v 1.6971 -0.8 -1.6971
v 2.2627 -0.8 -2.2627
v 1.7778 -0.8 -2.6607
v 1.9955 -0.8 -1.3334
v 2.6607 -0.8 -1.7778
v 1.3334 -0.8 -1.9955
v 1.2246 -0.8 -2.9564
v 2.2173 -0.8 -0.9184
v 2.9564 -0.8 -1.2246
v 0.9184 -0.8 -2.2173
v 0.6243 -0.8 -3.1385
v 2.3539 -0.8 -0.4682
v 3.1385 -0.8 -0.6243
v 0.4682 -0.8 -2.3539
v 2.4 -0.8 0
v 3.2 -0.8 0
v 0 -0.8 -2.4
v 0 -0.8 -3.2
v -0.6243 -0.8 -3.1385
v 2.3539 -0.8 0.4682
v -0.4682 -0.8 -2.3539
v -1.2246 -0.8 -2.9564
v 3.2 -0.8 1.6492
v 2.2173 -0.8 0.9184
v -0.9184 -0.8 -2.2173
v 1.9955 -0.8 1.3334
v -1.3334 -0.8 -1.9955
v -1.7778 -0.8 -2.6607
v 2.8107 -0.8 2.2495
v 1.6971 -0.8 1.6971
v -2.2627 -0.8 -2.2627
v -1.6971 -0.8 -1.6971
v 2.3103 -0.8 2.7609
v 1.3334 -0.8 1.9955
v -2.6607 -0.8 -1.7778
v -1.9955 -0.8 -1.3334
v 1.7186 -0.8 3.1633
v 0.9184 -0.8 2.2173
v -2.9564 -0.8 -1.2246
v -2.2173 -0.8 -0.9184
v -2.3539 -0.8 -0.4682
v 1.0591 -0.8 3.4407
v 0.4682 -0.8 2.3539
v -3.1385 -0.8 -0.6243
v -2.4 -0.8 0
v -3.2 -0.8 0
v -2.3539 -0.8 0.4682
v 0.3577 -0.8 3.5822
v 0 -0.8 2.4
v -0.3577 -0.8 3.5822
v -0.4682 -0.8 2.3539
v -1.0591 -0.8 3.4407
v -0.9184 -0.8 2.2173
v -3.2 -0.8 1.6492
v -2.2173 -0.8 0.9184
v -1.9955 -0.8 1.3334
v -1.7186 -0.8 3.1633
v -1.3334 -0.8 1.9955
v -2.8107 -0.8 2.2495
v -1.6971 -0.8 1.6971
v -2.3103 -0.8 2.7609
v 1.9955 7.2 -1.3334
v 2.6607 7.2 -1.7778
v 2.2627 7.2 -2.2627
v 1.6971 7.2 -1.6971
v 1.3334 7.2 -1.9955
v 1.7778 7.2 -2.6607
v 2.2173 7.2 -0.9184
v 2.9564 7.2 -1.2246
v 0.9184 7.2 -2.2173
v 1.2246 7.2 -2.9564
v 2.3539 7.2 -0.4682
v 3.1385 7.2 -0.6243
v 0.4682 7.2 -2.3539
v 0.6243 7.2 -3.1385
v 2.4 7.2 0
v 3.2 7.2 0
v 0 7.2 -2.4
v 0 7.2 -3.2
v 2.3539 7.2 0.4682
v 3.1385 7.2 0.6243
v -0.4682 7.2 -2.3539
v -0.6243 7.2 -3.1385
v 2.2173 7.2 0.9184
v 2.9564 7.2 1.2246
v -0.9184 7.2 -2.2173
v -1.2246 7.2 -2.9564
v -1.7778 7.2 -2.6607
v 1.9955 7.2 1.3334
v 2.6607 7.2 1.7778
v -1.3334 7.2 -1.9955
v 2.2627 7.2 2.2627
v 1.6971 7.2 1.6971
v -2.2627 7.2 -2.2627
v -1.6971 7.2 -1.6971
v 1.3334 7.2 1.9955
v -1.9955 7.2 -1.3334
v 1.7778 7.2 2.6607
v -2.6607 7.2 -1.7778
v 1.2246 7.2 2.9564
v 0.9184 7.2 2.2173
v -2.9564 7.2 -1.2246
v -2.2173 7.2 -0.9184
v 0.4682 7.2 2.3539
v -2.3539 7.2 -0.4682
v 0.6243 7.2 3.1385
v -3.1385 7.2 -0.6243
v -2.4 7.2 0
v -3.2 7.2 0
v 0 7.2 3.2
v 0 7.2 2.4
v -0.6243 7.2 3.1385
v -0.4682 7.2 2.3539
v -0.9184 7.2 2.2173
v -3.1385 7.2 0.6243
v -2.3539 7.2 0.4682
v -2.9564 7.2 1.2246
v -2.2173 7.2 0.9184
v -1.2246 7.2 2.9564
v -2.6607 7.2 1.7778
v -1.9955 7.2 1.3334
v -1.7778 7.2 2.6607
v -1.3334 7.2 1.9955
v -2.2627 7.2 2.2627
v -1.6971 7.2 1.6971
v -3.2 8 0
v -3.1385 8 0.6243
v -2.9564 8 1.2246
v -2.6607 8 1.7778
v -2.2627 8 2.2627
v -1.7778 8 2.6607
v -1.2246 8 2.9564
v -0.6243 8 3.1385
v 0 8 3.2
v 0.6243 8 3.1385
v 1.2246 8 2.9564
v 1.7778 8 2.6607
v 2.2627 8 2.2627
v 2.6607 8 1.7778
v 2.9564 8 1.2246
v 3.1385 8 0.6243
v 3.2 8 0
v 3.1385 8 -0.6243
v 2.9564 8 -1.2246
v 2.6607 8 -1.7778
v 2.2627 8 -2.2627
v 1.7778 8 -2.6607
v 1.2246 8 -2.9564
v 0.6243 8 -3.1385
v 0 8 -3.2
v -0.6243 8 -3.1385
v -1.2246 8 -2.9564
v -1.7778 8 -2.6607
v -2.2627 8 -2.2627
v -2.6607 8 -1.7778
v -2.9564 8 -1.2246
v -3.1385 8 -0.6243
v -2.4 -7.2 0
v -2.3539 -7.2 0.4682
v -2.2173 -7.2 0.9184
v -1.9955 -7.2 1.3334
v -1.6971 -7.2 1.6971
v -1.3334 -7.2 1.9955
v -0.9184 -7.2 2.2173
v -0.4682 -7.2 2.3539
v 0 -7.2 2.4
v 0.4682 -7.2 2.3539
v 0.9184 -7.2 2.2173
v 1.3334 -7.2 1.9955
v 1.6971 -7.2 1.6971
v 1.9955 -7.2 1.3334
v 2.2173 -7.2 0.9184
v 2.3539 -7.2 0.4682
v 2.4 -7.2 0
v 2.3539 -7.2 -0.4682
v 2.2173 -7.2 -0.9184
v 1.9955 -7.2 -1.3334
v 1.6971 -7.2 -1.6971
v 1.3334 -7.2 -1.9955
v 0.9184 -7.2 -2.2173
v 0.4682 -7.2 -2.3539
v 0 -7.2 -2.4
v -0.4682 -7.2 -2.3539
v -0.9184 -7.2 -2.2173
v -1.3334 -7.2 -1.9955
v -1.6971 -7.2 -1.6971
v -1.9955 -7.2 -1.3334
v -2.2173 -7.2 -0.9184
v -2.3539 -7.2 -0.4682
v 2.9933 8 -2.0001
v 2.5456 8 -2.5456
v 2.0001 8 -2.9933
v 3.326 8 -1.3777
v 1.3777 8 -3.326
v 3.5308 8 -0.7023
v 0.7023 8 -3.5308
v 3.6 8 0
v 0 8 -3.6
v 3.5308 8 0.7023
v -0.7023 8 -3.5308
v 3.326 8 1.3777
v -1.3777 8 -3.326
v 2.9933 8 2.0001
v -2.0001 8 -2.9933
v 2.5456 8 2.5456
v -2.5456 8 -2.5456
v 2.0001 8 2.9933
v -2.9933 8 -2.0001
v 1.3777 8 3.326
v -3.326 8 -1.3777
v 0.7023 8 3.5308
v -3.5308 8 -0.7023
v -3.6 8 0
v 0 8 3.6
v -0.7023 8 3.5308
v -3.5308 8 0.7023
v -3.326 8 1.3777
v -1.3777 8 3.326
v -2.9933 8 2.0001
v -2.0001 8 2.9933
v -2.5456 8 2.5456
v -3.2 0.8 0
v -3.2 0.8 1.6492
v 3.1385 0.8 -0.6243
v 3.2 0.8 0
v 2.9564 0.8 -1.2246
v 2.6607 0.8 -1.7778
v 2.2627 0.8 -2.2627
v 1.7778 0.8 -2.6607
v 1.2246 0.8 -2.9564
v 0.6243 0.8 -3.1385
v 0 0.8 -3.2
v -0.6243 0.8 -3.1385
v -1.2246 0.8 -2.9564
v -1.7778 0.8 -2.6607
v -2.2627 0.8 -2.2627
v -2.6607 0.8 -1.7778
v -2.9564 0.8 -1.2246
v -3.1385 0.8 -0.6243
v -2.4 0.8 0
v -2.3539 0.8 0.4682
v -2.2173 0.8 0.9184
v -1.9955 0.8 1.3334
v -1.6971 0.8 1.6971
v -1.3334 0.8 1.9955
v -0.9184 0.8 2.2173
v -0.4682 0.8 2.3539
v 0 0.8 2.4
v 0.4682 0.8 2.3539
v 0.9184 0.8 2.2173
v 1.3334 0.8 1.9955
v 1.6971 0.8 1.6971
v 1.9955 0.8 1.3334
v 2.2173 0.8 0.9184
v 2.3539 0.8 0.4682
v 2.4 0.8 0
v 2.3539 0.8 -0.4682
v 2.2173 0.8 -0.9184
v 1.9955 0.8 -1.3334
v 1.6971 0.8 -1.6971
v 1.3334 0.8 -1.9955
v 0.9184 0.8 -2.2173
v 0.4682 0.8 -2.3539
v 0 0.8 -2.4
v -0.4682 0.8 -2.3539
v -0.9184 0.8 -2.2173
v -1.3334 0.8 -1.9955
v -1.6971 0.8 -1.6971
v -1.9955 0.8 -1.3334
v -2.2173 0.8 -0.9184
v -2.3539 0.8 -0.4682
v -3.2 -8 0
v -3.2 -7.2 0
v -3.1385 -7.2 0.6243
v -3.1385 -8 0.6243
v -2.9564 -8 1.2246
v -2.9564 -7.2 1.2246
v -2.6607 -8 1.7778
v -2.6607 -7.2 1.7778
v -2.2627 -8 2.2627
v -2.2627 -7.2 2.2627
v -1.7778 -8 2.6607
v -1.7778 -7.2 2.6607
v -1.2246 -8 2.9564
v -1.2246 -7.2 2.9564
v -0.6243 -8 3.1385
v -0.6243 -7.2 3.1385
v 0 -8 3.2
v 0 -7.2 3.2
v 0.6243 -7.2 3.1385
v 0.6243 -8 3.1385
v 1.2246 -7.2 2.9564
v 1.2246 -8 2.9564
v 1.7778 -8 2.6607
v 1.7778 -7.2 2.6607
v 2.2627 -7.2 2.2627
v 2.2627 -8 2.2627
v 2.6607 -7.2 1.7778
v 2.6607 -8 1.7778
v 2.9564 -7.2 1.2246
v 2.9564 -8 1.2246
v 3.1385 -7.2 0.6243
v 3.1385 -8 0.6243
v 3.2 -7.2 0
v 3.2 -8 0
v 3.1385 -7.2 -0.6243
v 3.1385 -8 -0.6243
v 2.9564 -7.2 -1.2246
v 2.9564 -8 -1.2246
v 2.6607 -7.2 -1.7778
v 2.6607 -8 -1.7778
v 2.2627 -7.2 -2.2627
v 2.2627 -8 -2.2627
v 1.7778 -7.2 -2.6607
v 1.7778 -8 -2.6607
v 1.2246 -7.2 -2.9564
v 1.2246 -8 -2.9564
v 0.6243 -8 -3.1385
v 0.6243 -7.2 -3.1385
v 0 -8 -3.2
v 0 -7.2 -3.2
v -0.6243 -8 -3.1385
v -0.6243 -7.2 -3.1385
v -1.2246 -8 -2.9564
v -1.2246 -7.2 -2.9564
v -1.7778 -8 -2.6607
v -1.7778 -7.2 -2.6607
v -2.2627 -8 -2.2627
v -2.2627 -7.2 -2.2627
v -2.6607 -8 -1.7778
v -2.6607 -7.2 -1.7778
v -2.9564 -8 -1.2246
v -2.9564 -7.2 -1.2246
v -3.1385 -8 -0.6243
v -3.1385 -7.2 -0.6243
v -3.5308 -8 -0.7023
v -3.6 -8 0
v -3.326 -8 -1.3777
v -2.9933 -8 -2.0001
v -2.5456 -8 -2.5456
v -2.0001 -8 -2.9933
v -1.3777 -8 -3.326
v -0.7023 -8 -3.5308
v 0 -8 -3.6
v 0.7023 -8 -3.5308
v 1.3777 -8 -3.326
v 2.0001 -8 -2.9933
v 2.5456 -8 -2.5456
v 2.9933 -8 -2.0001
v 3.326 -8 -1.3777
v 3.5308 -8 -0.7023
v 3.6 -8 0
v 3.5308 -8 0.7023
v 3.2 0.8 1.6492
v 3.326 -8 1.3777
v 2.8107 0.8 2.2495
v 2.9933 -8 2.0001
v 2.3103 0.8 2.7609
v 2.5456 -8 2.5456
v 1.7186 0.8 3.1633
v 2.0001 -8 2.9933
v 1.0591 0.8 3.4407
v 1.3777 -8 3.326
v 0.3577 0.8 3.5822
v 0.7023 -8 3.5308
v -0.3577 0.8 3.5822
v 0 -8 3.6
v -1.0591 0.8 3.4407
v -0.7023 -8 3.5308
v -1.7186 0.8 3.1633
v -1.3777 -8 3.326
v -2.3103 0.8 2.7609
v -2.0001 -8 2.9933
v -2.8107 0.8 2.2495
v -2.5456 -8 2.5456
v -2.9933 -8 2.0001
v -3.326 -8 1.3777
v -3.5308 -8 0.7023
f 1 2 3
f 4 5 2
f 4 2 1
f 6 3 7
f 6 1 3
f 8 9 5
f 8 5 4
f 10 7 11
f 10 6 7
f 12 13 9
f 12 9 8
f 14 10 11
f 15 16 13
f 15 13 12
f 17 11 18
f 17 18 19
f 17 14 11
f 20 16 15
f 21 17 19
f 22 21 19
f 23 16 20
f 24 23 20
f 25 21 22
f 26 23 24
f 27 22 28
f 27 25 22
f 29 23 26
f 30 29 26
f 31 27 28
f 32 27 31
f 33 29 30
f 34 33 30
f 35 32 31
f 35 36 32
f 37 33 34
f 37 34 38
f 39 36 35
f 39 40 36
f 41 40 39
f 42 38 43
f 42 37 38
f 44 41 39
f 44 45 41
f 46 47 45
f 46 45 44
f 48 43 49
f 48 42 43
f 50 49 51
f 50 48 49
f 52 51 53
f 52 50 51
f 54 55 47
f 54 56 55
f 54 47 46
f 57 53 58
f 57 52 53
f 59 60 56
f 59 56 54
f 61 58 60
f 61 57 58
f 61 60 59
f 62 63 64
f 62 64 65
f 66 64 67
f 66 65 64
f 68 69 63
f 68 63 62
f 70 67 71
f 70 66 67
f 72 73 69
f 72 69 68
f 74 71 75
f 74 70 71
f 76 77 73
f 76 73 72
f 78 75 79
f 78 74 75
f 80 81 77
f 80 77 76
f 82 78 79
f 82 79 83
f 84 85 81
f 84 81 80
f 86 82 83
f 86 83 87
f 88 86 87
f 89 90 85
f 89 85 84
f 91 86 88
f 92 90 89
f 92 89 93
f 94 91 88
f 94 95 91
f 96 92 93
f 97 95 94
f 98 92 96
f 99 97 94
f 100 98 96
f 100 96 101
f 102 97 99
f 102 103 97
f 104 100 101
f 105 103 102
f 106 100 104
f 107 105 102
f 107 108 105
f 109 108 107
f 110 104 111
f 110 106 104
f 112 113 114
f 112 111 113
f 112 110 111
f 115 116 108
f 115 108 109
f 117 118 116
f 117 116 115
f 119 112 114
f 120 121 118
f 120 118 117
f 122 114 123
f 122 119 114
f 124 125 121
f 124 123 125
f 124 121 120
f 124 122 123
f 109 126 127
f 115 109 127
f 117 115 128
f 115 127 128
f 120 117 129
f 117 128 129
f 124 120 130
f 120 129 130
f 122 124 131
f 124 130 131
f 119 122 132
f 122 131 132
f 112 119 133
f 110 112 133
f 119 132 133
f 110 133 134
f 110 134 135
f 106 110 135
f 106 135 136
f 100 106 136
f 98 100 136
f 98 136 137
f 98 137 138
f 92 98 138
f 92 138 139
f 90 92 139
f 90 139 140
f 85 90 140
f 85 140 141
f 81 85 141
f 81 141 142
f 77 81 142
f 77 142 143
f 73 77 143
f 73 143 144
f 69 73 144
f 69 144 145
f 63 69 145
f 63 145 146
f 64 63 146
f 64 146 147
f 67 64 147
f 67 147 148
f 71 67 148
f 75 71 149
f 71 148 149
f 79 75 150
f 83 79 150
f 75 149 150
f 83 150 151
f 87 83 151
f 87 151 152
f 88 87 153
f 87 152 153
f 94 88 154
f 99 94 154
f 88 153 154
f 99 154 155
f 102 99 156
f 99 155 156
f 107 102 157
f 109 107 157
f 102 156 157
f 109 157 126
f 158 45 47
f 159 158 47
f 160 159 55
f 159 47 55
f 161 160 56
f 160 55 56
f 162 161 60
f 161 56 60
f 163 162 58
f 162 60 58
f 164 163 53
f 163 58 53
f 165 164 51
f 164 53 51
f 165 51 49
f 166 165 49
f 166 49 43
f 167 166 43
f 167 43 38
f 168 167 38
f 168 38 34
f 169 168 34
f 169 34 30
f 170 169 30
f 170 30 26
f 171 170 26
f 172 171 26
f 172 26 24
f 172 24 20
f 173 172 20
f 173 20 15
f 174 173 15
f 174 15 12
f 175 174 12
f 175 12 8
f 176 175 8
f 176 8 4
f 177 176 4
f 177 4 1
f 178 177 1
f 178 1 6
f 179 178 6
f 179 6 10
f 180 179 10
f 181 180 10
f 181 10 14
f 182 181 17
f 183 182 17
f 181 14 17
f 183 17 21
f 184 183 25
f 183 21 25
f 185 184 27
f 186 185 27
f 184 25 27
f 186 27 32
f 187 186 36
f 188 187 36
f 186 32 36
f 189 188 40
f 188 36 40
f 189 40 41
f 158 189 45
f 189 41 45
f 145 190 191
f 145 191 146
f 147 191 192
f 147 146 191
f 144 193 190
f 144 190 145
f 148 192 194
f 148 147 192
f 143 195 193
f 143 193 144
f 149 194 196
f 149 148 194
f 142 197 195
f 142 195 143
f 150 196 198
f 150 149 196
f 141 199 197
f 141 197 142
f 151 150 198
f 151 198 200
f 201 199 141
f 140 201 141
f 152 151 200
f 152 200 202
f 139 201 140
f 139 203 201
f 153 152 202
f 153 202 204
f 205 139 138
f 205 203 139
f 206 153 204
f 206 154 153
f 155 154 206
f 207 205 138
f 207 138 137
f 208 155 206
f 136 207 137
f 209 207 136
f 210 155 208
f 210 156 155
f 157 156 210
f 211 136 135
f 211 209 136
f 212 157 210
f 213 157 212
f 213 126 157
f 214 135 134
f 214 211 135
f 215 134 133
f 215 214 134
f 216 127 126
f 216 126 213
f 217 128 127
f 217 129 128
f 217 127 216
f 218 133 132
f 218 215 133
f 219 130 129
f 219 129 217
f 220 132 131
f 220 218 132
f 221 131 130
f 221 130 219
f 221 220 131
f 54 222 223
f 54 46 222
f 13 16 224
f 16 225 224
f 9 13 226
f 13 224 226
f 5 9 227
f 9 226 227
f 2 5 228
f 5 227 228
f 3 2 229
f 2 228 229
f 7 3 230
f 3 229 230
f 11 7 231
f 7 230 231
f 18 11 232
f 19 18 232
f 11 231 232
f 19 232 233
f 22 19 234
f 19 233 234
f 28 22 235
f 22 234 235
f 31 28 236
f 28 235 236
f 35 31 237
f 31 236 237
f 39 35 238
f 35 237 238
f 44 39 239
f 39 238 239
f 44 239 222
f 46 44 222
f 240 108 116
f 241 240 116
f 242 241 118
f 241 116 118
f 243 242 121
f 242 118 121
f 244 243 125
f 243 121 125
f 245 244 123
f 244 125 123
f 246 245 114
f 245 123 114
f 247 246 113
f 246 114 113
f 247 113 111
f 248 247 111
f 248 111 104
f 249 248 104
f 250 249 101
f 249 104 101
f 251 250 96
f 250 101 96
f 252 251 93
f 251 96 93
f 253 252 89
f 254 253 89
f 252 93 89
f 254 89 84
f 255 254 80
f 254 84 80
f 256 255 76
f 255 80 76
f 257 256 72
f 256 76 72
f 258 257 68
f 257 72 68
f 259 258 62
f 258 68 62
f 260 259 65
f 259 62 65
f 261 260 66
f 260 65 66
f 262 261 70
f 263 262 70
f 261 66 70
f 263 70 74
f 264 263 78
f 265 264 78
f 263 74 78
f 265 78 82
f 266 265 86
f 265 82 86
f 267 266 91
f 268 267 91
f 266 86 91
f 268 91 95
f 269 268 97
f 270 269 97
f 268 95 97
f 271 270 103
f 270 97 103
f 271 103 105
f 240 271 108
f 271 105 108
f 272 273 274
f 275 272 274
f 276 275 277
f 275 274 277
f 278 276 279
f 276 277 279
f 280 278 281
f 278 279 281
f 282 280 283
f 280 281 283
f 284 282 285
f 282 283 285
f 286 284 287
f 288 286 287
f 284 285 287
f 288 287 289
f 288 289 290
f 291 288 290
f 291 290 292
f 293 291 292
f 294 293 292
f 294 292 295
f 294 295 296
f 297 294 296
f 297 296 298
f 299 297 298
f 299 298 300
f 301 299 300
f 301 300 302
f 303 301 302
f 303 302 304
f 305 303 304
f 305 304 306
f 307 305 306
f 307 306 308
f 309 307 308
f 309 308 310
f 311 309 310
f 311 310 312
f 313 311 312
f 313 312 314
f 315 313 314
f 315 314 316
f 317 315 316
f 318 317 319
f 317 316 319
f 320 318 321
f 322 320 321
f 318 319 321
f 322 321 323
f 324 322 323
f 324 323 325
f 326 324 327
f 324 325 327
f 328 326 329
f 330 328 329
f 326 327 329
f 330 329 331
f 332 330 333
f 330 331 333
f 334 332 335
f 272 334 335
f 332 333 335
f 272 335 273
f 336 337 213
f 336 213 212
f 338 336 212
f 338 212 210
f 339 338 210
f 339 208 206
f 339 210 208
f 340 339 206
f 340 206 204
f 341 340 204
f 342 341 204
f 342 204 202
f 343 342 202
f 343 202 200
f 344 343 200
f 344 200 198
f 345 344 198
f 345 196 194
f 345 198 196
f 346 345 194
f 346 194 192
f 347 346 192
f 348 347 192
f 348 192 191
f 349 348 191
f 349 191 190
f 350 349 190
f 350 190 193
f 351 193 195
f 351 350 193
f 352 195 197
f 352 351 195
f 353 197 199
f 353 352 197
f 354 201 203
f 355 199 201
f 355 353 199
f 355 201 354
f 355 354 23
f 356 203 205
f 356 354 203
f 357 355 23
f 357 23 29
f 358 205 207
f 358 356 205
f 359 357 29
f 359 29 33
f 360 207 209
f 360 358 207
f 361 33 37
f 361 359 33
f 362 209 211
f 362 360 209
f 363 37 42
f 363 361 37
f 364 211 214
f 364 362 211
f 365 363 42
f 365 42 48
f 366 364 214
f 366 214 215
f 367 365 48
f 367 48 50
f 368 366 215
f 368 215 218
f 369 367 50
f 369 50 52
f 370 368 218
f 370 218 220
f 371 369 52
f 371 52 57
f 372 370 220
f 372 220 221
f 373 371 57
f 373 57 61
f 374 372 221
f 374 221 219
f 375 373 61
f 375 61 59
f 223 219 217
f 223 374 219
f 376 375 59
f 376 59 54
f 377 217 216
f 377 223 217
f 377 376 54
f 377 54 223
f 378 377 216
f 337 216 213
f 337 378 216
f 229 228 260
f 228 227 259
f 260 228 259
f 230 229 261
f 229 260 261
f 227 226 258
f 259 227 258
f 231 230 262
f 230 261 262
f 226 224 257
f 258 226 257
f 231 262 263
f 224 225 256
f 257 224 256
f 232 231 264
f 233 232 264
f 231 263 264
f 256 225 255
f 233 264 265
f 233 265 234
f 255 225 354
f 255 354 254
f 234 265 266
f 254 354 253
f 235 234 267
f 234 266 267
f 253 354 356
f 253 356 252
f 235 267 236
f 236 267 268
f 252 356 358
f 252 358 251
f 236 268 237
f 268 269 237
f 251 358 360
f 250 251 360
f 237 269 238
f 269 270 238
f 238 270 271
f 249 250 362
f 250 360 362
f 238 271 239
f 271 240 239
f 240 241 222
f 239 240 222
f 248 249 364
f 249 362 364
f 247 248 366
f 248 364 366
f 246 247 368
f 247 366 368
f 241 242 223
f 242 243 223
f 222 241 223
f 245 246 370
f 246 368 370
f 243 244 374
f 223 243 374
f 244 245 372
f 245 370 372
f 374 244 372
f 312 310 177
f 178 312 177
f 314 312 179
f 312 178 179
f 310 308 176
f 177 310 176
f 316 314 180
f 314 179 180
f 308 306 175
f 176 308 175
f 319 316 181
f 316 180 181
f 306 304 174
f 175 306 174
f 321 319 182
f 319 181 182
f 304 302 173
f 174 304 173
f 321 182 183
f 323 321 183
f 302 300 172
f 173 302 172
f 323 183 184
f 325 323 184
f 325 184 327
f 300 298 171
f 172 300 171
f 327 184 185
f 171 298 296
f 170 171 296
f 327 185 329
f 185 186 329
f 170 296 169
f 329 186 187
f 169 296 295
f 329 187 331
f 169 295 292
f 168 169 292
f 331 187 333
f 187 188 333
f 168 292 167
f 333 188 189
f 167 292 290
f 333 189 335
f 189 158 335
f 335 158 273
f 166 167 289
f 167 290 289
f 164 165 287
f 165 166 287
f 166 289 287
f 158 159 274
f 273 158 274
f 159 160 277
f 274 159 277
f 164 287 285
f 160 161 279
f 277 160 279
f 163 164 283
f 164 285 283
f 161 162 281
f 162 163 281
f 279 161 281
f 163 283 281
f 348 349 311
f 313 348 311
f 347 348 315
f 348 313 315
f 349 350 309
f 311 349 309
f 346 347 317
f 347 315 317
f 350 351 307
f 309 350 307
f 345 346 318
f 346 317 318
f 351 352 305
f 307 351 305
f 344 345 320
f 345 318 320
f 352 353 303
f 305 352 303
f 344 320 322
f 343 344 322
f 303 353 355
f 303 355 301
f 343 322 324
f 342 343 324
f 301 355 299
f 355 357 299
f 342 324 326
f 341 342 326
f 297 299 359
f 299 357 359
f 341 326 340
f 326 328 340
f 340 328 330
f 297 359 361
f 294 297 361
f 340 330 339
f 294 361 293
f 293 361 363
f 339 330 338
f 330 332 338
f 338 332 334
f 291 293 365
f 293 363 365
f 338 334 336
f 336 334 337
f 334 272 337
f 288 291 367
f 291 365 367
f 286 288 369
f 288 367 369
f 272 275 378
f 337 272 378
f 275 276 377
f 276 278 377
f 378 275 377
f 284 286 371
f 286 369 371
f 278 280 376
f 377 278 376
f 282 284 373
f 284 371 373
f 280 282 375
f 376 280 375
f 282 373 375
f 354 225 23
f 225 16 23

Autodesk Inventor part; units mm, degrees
ref_plane "YZ Plane" through (0, 0, 0) normal (1, 0, 0) x (0, 1, 0)
ref_plane "XZ Plane" through (0, 0, 0) normal (0, 1, 0) x (-1, 0, 0)
ref_plane "XY Plane" through (0, 0, 0) normal (0, 0, 1) x (1, 0, 0)
sketch "Sketch2" plane through (0, 0, 0) normal (0, 0, 1) x (1, 0, 0)
  line L0 (0, -11.2) -> (0, 11.2) projected
  line L1 (-3.6, 8) -> (-3.6, -8)
  line L2 (-3.6, -8) -> (-3.2, -8)
  line L3 (-3.2, -8) -> (-3.2, -7.2)
  line L4 (-3.2, -7.2) -> (-2.4, -7.2)
  line L5 (-2.4, -7.2) -> (-2.4, -0.8)
  line L6 (-2.4, -0.8) -> (-3.2, -0.8)
  line L7 (-3.2, -0.8) -> (-3.2, 0.8)
  line L8 (-3.2, 0.8) -> (-2.4, 0.8)
  line L9 (-2.4, 0.8) -> (-2.4, 7.2)
  line L10 (-2.4, 7.2) -> (-3.2, 7.2)
  line L11 (-3.2, 7.2) -> (-3.2, 8)
  line L12 (-3.2, 8) -> (-3.6, 8)
  point P0 (0, 0)
  point P1 (-3.2, 0)
  dimension "d0" = 16
  dimension "d1" = 6.4
  dimension "d2" = 7.2
  dimension "d3" = 4.8
  dimension "d4" = 0.8
  dimension "d5" = 1.6
revolve "Revolution1" add sketch "Sketch2" angle 360 about axis through (0, -10, 0) along (0, 1, 0)
sketch "Sketch3" plane through (0, 0, 0) normal (0, 1, 0) x (-1, 0, 0)
  circle A0 centre (0, 0) radius 3.2 projected
  circle A1 centre (0, 0) radius 3.6 projected
  line L0 (-3.2, 0) -> (-3.2, 1.6492)
  line L1 (3.2, 0) -> (3.2, 1.6492)
extrude "Extrusion1" cut sketch "Sketch3" along normal up to surface (1.6 mm away) from surface at -0.8 contours A0 L0 A1 L1 picked at (-0.1286, 3.4412)
equation "\"d0\" = 2 * lu"
equation "\"d1\" = tsd"
equation "\"d2\" = tlad"
equation "\"d3\" = tpd"
equation "\"d4\" = tsl"
equation "\"d5\" = 2 * tsl"
equation "\"lu\" = 8"
equation "\"tsd\" = 6.4"
equation "\"tlad\" = 7.2"
equation "\"tpd\" = 4.8"
equation "\"tsl\" = 0.8"
properties part number "62462-LtBluishGray" material "ABS Plastic"
